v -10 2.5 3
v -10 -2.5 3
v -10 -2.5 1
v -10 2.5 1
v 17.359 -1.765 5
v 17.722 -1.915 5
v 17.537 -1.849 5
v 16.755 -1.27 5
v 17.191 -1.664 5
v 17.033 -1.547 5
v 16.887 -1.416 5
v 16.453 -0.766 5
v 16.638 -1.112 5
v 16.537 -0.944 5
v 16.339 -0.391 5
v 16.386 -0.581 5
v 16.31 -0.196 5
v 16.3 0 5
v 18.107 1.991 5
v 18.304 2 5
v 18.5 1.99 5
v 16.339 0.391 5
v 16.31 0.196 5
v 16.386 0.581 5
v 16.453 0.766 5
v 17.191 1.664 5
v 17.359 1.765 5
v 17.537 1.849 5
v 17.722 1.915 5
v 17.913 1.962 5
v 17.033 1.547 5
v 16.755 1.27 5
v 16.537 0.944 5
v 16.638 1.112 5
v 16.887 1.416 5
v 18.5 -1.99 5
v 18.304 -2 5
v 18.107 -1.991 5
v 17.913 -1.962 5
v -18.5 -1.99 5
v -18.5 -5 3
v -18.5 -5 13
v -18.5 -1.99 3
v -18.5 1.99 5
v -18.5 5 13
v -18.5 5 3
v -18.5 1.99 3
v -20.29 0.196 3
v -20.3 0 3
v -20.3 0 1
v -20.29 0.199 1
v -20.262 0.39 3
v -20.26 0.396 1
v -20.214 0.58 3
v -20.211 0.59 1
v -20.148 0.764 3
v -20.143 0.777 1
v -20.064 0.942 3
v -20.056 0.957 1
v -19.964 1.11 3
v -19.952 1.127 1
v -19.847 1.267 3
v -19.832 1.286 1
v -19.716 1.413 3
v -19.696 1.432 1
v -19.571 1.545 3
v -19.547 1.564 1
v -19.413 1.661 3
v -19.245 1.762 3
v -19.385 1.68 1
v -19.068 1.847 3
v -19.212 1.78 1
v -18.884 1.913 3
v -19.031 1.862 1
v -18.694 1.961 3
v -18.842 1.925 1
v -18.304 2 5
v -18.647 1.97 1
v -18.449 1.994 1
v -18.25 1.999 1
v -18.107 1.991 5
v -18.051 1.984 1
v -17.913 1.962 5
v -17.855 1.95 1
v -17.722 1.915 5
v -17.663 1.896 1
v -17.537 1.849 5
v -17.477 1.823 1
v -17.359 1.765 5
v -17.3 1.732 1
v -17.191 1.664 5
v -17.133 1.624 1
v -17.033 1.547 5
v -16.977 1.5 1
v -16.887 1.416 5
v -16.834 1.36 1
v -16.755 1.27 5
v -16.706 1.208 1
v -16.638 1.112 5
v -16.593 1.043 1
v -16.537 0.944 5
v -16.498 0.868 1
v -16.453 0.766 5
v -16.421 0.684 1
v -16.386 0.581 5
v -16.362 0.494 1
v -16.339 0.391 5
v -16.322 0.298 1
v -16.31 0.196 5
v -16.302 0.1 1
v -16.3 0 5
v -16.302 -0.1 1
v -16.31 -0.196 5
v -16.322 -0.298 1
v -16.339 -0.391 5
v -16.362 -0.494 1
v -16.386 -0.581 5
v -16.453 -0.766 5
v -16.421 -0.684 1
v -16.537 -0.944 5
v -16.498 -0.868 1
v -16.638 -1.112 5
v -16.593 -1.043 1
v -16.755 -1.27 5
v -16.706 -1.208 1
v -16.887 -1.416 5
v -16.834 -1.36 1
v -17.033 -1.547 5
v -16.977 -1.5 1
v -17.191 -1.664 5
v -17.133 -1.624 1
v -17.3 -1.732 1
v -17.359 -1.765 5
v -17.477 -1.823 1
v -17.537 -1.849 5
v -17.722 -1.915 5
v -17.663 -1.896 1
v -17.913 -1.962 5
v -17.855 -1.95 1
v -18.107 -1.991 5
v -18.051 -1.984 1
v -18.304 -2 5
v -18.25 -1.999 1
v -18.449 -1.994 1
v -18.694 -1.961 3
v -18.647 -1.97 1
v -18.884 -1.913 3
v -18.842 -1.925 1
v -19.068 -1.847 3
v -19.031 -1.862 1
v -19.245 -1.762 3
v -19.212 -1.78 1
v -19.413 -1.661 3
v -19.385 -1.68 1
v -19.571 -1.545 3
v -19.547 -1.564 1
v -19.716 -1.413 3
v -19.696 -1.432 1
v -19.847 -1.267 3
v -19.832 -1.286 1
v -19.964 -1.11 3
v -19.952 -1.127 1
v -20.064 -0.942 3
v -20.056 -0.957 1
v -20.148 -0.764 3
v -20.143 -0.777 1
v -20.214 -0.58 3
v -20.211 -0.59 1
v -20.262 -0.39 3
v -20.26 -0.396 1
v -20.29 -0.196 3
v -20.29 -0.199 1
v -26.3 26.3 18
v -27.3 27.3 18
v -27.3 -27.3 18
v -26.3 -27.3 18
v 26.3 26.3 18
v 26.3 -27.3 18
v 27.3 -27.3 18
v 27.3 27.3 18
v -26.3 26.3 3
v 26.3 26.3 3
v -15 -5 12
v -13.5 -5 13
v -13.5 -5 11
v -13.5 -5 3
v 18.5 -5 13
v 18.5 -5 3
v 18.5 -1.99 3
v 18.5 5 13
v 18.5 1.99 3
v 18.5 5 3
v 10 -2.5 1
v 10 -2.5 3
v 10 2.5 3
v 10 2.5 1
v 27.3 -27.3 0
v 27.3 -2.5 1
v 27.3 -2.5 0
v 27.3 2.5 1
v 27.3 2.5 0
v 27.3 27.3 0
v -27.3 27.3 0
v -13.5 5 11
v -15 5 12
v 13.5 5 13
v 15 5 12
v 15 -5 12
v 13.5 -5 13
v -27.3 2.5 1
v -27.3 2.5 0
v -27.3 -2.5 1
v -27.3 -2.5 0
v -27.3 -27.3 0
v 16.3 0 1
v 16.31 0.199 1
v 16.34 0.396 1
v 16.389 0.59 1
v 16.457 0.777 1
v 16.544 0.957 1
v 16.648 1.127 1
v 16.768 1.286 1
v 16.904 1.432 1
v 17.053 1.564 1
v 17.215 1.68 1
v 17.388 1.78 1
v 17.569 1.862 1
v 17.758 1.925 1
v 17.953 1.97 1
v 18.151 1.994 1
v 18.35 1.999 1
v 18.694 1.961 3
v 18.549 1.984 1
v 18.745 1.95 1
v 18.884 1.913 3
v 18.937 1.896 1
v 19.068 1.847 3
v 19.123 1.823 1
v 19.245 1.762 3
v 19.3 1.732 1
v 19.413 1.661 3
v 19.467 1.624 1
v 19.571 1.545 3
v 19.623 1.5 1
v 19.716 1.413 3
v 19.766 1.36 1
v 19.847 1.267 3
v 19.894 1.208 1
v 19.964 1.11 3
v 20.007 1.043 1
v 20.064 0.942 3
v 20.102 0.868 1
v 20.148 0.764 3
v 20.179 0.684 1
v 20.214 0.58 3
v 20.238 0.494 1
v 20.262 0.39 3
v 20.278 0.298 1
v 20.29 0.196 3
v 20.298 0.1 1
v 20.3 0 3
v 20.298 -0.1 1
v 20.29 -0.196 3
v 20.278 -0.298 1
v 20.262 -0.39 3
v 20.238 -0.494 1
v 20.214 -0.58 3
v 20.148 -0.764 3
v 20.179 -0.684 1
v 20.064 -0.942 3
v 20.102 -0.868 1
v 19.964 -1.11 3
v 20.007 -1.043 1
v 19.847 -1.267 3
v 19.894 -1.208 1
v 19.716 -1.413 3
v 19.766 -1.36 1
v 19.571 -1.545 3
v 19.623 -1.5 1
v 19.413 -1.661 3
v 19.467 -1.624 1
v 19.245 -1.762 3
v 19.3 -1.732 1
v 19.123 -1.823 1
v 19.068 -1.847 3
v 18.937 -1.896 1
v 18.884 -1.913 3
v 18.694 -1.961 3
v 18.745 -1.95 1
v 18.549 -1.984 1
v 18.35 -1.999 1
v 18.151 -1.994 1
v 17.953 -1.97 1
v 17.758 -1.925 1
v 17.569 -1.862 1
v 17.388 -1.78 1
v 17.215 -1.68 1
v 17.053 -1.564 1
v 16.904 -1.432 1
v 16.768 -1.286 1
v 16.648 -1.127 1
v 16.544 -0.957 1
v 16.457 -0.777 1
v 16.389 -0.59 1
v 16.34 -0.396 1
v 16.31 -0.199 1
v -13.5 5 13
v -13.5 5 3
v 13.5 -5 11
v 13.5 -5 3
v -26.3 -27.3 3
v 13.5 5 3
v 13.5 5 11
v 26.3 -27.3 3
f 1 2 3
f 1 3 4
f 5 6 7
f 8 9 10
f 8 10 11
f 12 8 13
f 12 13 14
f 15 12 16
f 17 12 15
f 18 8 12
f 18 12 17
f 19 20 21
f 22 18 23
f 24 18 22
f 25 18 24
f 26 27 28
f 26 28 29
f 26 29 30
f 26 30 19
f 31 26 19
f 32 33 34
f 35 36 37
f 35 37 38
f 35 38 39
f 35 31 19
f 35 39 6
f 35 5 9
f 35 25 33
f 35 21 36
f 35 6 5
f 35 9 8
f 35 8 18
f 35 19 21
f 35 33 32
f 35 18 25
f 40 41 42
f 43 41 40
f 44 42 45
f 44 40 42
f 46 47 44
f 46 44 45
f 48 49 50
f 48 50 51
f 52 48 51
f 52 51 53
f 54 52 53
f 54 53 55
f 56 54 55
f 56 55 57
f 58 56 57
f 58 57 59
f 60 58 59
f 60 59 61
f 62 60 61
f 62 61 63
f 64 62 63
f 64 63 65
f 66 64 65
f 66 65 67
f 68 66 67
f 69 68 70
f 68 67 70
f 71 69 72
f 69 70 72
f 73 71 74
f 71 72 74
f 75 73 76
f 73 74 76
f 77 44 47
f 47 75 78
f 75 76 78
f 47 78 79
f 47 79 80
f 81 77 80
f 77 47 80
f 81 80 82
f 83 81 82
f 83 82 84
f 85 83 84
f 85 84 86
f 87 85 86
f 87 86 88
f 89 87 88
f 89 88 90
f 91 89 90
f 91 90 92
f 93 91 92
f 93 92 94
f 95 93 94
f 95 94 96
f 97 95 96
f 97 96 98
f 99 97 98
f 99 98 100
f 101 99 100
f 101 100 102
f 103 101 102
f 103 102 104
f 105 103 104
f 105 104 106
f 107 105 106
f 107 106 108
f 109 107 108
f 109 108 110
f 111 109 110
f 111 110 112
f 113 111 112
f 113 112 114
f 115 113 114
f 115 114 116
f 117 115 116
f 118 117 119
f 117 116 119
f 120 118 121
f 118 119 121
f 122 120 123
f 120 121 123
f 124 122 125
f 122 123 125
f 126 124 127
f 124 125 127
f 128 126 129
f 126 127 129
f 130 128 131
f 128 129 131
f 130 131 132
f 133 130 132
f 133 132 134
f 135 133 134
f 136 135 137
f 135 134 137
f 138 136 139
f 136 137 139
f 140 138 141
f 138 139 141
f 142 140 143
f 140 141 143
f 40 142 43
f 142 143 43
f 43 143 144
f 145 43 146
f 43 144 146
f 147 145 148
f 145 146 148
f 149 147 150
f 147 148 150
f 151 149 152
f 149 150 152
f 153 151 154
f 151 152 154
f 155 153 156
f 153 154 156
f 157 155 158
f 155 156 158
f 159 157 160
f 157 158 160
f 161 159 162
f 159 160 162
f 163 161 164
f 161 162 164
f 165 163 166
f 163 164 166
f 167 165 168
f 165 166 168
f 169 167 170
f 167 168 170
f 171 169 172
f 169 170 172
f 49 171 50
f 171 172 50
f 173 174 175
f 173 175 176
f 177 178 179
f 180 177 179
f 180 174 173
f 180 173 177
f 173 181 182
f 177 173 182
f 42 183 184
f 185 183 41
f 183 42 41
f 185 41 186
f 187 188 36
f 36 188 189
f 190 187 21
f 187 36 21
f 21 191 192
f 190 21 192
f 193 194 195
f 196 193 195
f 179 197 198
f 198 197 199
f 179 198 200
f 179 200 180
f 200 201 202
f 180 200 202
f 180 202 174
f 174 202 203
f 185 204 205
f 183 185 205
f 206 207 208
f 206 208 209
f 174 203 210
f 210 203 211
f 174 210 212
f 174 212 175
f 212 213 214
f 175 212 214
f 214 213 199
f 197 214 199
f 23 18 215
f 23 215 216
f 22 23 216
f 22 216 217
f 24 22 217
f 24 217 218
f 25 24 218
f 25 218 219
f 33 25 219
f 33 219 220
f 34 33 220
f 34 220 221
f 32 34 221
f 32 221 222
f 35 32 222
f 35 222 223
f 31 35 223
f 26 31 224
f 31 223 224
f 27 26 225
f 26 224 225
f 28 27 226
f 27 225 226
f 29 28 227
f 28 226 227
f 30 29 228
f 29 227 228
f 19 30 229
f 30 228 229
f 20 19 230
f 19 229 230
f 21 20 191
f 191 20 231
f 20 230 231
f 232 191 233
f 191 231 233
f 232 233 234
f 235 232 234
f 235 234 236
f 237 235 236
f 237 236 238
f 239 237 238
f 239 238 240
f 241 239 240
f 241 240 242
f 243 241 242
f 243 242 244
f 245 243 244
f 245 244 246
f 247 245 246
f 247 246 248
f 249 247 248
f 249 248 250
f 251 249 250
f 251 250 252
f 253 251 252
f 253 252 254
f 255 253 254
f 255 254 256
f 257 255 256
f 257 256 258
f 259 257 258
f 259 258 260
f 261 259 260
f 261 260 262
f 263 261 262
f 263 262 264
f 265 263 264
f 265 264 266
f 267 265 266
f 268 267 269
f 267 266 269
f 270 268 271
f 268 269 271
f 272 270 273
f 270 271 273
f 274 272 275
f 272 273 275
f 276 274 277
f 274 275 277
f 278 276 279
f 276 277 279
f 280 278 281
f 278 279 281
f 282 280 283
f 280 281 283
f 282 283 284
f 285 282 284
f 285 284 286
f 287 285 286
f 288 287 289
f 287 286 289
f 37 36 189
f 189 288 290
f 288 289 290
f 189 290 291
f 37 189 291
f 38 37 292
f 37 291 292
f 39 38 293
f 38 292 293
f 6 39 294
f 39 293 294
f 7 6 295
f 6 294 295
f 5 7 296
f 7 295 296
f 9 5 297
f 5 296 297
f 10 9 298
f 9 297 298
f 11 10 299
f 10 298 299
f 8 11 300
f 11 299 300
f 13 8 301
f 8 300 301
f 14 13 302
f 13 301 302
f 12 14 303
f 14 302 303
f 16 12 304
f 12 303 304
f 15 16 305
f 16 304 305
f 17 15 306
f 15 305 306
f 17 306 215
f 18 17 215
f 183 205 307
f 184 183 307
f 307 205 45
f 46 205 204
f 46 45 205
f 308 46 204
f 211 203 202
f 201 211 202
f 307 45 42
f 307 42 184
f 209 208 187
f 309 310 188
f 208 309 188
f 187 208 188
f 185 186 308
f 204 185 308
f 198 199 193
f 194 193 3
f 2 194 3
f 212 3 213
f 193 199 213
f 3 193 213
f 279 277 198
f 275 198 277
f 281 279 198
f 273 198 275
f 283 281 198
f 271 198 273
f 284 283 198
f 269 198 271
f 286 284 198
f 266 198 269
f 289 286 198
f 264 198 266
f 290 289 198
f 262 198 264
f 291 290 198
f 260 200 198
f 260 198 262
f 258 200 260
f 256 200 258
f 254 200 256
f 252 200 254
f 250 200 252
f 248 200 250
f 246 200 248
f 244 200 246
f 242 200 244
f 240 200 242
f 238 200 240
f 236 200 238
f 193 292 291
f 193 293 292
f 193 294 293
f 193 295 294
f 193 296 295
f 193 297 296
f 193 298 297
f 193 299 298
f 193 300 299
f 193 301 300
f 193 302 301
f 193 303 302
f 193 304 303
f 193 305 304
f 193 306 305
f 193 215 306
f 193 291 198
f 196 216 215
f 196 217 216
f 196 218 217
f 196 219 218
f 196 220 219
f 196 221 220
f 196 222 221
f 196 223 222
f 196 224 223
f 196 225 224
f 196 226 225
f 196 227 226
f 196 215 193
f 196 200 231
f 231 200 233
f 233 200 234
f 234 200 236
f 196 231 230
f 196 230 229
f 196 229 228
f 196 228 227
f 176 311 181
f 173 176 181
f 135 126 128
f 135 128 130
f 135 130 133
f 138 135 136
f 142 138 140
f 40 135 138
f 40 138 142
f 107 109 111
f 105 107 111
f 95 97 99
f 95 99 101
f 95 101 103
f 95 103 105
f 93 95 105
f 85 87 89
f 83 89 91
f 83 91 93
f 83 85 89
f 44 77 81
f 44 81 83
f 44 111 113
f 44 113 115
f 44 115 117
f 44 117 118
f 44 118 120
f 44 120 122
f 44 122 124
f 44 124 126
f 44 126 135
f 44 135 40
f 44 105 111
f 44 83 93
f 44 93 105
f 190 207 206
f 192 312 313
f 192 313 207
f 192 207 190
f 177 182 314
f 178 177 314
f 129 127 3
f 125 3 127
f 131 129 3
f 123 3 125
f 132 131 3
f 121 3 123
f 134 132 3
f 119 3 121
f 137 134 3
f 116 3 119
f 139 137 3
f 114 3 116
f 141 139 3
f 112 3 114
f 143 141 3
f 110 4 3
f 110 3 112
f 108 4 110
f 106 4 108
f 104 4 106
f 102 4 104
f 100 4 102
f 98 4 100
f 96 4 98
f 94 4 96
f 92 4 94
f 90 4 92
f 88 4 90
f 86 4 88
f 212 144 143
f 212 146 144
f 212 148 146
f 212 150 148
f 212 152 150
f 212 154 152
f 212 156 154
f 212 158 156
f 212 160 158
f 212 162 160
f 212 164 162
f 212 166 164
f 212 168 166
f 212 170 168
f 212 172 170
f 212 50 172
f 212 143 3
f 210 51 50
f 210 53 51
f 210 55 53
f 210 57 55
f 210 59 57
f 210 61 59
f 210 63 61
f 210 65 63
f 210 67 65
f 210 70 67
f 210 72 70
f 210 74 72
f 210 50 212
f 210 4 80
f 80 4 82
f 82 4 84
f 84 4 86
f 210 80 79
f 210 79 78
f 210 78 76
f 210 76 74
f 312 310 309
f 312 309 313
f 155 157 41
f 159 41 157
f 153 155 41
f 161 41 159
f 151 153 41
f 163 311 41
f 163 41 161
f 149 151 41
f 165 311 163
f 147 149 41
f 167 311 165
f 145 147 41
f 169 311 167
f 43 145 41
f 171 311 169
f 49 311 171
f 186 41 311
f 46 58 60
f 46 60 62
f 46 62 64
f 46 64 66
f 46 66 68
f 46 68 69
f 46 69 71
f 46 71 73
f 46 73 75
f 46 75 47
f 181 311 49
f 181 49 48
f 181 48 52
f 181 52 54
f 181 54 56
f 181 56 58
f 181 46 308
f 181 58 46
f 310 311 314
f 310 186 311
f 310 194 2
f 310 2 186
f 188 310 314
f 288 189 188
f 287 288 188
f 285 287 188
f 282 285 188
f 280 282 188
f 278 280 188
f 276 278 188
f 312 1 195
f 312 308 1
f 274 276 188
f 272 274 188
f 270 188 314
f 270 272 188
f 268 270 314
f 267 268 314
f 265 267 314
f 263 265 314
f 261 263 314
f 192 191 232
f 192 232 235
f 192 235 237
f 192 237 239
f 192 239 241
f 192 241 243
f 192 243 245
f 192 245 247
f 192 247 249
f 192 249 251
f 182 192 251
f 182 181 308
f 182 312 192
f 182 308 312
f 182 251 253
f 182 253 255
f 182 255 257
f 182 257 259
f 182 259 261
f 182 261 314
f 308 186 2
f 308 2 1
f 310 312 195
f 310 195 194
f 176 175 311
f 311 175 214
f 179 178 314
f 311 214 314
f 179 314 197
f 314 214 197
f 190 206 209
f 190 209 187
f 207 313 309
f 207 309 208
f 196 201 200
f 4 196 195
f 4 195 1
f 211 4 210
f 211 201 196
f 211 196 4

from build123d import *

# Parameters (mm, degrees)
SKICA1_W                 = 54.6
SKICA1_H                 = 54.6
P_IDAT_VYSUNUT_M2_DEPTH  = 3
SKICA4_W                 = 20
SKICA4_H                 = 5
ODEBRAT_VYSUNUT_M1_DEPTH = 2
SKICA5_W                 = 54.6
SKICA5_H                 = 5
ODEBRAT_VYSUNUT_M3_DEPTH = 1
SKICA10_W                = 5
SKICA10_H                = 10
P_IDAT_VYSUNUT_M6_DEPTH  = 10
ODEBRAT_VYSUNUT_M6_DEPTH = 10
P_IDAT_VYSUNUT_M9_DEPTH  = 15
SKICA17_R                = 2
ODEBRAT_VYSUNUT_M8_DEPTH = 4


with BuildPart() as part:
    # Skica1 → Přidat vysunutím2 (new body)
    with BuildSketch(Plane.XY):
        Rectangle(SKICA1_W, SKICA1_H)
    extrude(amount=P_IDAT_VYSUNUT_M2_DEPTH)

    # Skica4 → Odebrat vysunutím1 (cut)
    with BuildSketch(Plane.XY.offset(3)):
        Rectangle(SKICA4_W, SKICA4_H)
    extrude(amount=-ODEBRAT_VYSUNUT_M1_DEPTH, mode=Mode.SUBTRACT)

    # Skica5 → Odebrat vysunutím3 (cut)
    with BuildSketch(Plane(origin=(0, 0, 0), x_dir=(-1, 0, 0), z_dir=(0, 0, -1))):
        Rectangle(SKICA5_W, SKICA5_H)
    extrude(amount=-ODEBRAT_VYSUNUT_M3_DEPTH, mode=Mode.SUBTRACT)

    # Skica10 → Přidat vysunutím6 (add)
    with BuildSketch(Plane.XY.offset(3)):
        with Locations((-16, 0)):
            Rectangle(SKICA10_W, SKICA10_H)
        with Locations((16, 0)):
            Rectangle(SKICA10_W, SKICA10_H)
    extrude(amount=P_IDAT_VYSUNUT_M6_DEPTH)

    # Skica12 → Odebrat vysunutím6 (cut)
    with BuildSketch(Plane(origin=(0, 5, 0), x_dir=(1, 0, 0), z_dir=(0, 1, 0))):
        Polygon((-13.5, -13), (-13.5, -11), (-15, -12), align=None)
        Polygon((13.5, -13), (13.5, -11), (15, -12), align=None)
    extrude(amount=-ODEBRAT_VYSUNUT_M6_DEPTH, mode=Mode.SUBTRACT)

    # Skica14 → Přidat vysunutím9 (add)
    with BuildSketch(Plane.XY.offset(3)):
        Polygon((27.3, 27.3), (-27.3, 27.3), (-27.3, -27.3), (-26.3, -27.3), (-26.3, 26.3), (26.3, 26.3), (26.3, -27.3), (27.3, -27.3), align=None)
    extrude(amount=P_IDAT_VYSUNUT_M9_DEPTH)

    # Skica17 → Odebrat vysunutím8 (cut)
    with BuildSketch(Plane(origin=(0, 0, 1), x_dir=(-1, 0, 0), z_dir=(0, 0, -1))):
        with Locations((-18.3, 0)):
            Circle(SKICA17_R)
        with Locations((18.3, 0)):
            Circle(SKICA17_R)
    extrude(amount=-ODEBRAT_VYSUNUT_M8_DEPTH, mode=Mode.SUBTRACT)


solid = part.part
